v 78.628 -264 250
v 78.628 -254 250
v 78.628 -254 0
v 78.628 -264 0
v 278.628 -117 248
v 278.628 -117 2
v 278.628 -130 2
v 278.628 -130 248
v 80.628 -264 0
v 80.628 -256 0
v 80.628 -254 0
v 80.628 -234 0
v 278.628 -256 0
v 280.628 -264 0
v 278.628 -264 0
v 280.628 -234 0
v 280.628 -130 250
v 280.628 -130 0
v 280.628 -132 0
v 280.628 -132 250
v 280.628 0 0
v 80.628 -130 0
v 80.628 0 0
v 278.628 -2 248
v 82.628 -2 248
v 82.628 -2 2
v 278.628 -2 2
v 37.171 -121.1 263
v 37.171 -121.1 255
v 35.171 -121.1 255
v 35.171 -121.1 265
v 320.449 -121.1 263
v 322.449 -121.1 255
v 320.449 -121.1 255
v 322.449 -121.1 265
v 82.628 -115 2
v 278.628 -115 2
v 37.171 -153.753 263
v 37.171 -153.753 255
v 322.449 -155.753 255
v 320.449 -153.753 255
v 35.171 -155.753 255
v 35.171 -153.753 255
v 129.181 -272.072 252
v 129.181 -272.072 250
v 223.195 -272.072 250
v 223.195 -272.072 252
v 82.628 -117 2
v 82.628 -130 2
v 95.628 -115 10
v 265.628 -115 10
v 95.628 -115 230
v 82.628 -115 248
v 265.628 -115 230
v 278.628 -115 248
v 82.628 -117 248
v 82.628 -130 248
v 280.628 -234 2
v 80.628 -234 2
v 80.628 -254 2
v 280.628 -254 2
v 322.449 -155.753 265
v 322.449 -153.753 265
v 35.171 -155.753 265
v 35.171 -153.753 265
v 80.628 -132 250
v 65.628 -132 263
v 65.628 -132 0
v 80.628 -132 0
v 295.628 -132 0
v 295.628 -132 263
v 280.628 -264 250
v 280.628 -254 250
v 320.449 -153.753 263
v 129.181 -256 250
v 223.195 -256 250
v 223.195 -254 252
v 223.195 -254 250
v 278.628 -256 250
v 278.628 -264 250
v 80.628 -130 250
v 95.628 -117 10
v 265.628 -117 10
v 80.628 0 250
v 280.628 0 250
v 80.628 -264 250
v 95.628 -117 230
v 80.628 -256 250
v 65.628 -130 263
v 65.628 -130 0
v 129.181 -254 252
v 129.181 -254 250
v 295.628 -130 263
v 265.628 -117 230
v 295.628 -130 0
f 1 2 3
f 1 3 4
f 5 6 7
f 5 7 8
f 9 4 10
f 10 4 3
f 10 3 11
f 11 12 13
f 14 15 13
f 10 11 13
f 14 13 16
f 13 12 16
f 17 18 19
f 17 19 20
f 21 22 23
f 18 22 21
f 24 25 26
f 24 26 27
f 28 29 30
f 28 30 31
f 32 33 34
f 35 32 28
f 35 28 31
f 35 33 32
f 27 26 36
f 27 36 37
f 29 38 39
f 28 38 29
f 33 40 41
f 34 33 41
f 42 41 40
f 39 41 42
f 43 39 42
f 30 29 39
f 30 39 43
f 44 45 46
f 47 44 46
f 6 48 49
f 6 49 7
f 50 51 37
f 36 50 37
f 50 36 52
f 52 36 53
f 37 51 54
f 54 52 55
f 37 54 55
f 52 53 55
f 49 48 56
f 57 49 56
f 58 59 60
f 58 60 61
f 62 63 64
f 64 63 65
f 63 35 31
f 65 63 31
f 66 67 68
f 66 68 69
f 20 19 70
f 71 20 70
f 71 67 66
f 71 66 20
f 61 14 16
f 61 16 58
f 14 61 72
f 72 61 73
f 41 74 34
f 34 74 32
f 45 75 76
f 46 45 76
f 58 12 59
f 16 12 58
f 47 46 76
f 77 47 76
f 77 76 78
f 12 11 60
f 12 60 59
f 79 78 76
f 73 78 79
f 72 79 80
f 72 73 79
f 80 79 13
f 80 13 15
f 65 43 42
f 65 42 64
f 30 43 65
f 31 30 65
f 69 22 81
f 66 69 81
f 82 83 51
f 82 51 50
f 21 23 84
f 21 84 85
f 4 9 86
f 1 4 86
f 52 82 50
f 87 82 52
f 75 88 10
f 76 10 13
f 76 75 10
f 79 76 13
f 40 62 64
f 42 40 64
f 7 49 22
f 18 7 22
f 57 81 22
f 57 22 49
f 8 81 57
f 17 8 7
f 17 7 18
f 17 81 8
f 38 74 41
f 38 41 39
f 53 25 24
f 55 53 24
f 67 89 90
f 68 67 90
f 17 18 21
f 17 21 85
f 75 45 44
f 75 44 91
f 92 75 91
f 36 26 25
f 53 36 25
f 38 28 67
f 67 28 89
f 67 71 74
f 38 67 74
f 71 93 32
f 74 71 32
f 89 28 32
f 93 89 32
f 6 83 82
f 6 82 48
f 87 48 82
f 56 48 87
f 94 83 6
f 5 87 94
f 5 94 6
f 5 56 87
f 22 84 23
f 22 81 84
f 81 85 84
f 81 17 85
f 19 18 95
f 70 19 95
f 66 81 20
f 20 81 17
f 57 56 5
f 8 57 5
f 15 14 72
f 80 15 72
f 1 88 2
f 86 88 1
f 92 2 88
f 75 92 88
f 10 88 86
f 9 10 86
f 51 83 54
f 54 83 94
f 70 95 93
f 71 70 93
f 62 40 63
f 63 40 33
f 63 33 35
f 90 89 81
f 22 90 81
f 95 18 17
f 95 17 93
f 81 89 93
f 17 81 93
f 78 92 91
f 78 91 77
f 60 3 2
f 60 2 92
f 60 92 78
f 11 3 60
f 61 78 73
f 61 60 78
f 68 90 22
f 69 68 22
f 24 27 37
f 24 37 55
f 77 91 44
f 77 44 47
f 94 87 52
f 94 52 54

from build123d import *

# Parameters (mm, degrees)
F0_W      = 200
F0_H      = 250
F1_DEPTH  = 130
F2_T      = -2
F4_W      = 15
F4_H      = 220
F5_DEPTH  = 2
F7_W      = 15
F7_H      = 250
F8_DEPTH  = 2
F10_W     = 200
F10_H     = 250
F11_DEPTH = 2
F15_W     = 10
F15_H     = 250
F16_DEPTH = 2
F17_W     = 10
F17_H     = 250
F18_DEPTH = 2
F19_W     = 200
F19_H     = 20
F20_DEPTH = 2
F25_W     = 94.0138921142
F25_H     = 18.0724263191
F26_DEPTH = 2
F27_W     = 283.2776047289
F27_H     = 32.6531976461
F28_DEPTH = 2
F30_W     = 32.6531976461
F30_H     = 10
F31_DEPTH = 2
F33_W     = 32.6531976461
F33_H     = 10
F34_DEPTH = 2
F36_W     = 287.2776047289
F36_H     = 10
F37_DEPTH = 2


with BuildPart() as f1:
    # F0 (on Front) → F1 (new body)
    with BuildSketch(Plane.XZ):
        with Locations((180.6282737516, 125)):
            Rectangle(F0_W, F0_H)
    extrude(amount=F1_DEPTH)

    # F2
    f2_openings = [f1.faces().sort_by_distance(p)[0] for p in [
        (180.628274, -130, 125),
    ]]
    offset(amount=F2_T, openings=f2_openings)

    # F4 (on offset) → F5 (join)
    with BuildSketch(Plane.XZ.offset(117)):
        Polygon((280.6282737516, 250), (80.6282737516, 250), (80.6282737516, 230), (95.6282737516, 230), (265.6282737516, 230), (280.6282737516, 230), align=None)
        Polygon((95.6282737516, 230), (80.6282737516, 230), (80.6282737516, 0), (95.6282737516, 0), (95.6282737516, 10), align=None)
        with Locations((273.1282737516, 120)):
            Rectangle(F4_W, F4_H)
        Polygon((280.6282737516, 0), (280.6282737516, 10), (265.6282737516, 10), (95.6282737516, 10), (95.6282737516, 0), align=None)
    extrude(amount=-F5_DEPTH)

    # F7 (on offset) → F8 (join)
    with BuildSketch(Plane.XZ.offset(130)):
        with Locations((73.1282737516, 125)):
            Rectangle(F7_W, F7_H)
        Polygon((65.6282737516, 250), (80.6282737516, 250), (280.6282737516, 250), (295.6282737516, 250), (295.6282737516, 265), (65.6282737516, 265), align=None)
        with Locations((288.1282737516, 125)):
            Rectangle(F7_W, F7_H)
    extrude(amount=F8_DEPTH)

    # F27 (on line) → F28 (join)
    with BuildSketch(Plane.XY.offset(265)):
        with Locations((178.8100730628, -137.4265988231)):
            Rectangle(F27_W, F27_H)
    extrude(amount=-F28_DEPTH)

    # F30 (on line) → F31 (join)
    with BuildSketch(Plane.YZ.offset(320.4488754272)):
        with Locations((-137.4265988231, 260)):
            Rectangle(F30_W, F30_H)
    extrude(amount=F31_DEPTH)

    # F33 (on line) → F34 (join)
    with BuildSketch(Plane.YZ.offset(37.1712706983)):
        with Locations((-137.4265988231, 260)):
            Rectangle(F33_W, F33_H)
    extrude(amount=-F34_DEPTH)

    # F36 (on line) → F37 (join)
    with BuildSketch(Plane(origin=(0, -153.7531976461, 0), x_dir=(-1, 0, 0), z_dir=(0, 1, 0))):
        with Locations((-178.8100730628, 260)):
            Rectangle(F36_W, F36_H)
    extrude(amount=-F37_DEPTH)


with BuildPart() as f11:
    # F10 (on offset) → F11 (new body)
    with BuildSketch(Plane.XZ.offset(254)):
        with Locations((180.6282737516, 125)):
            Rectangle(F10_W, F10_H)
    extrude(amount=F11_DEPTH)

    # F15 (on line) → F16 (join)
    with BuildSketch(Plane(origin=(80.6282737516, 0, 0), x_dir=(0, -1, 0), z_dir=(-1, 0, 0))):
        with Locations((259, 125)):
            Rectangle(F15_W, F15_H)
    extrude(amount=F16_DEPTH)

    # F17 (on line) → F18 (join)
    with BuildSketch(Plane(origin=(280.6282737516, 0, 0), x_dir=(0, -1, 0), z_dir=(-1, 0, 0))):
        with Locations((259, 125)):
            Rectangle(F17_W, F17_H)
    extrude(amount=F18_DEPTH)

    # F19 (on line) → F20 (join)
    with BuildSketch(Plane.XY):
        with Locations((180.6282737516, -244)):
            Rectangle(F19_W, F19_H)
    extrude(amount=F20_DEPTH)

    # F25 (on line) → F26 (join)
    with BuildSketch(Plane.XY.offset(250)):
        with Locations((176.1883087456, -263.0362131596)):
            Rectangle(F25_W, F25_H)
    extrude(amount=F26_DEPTH)


solid = Compound([f1.part, f11.part])
